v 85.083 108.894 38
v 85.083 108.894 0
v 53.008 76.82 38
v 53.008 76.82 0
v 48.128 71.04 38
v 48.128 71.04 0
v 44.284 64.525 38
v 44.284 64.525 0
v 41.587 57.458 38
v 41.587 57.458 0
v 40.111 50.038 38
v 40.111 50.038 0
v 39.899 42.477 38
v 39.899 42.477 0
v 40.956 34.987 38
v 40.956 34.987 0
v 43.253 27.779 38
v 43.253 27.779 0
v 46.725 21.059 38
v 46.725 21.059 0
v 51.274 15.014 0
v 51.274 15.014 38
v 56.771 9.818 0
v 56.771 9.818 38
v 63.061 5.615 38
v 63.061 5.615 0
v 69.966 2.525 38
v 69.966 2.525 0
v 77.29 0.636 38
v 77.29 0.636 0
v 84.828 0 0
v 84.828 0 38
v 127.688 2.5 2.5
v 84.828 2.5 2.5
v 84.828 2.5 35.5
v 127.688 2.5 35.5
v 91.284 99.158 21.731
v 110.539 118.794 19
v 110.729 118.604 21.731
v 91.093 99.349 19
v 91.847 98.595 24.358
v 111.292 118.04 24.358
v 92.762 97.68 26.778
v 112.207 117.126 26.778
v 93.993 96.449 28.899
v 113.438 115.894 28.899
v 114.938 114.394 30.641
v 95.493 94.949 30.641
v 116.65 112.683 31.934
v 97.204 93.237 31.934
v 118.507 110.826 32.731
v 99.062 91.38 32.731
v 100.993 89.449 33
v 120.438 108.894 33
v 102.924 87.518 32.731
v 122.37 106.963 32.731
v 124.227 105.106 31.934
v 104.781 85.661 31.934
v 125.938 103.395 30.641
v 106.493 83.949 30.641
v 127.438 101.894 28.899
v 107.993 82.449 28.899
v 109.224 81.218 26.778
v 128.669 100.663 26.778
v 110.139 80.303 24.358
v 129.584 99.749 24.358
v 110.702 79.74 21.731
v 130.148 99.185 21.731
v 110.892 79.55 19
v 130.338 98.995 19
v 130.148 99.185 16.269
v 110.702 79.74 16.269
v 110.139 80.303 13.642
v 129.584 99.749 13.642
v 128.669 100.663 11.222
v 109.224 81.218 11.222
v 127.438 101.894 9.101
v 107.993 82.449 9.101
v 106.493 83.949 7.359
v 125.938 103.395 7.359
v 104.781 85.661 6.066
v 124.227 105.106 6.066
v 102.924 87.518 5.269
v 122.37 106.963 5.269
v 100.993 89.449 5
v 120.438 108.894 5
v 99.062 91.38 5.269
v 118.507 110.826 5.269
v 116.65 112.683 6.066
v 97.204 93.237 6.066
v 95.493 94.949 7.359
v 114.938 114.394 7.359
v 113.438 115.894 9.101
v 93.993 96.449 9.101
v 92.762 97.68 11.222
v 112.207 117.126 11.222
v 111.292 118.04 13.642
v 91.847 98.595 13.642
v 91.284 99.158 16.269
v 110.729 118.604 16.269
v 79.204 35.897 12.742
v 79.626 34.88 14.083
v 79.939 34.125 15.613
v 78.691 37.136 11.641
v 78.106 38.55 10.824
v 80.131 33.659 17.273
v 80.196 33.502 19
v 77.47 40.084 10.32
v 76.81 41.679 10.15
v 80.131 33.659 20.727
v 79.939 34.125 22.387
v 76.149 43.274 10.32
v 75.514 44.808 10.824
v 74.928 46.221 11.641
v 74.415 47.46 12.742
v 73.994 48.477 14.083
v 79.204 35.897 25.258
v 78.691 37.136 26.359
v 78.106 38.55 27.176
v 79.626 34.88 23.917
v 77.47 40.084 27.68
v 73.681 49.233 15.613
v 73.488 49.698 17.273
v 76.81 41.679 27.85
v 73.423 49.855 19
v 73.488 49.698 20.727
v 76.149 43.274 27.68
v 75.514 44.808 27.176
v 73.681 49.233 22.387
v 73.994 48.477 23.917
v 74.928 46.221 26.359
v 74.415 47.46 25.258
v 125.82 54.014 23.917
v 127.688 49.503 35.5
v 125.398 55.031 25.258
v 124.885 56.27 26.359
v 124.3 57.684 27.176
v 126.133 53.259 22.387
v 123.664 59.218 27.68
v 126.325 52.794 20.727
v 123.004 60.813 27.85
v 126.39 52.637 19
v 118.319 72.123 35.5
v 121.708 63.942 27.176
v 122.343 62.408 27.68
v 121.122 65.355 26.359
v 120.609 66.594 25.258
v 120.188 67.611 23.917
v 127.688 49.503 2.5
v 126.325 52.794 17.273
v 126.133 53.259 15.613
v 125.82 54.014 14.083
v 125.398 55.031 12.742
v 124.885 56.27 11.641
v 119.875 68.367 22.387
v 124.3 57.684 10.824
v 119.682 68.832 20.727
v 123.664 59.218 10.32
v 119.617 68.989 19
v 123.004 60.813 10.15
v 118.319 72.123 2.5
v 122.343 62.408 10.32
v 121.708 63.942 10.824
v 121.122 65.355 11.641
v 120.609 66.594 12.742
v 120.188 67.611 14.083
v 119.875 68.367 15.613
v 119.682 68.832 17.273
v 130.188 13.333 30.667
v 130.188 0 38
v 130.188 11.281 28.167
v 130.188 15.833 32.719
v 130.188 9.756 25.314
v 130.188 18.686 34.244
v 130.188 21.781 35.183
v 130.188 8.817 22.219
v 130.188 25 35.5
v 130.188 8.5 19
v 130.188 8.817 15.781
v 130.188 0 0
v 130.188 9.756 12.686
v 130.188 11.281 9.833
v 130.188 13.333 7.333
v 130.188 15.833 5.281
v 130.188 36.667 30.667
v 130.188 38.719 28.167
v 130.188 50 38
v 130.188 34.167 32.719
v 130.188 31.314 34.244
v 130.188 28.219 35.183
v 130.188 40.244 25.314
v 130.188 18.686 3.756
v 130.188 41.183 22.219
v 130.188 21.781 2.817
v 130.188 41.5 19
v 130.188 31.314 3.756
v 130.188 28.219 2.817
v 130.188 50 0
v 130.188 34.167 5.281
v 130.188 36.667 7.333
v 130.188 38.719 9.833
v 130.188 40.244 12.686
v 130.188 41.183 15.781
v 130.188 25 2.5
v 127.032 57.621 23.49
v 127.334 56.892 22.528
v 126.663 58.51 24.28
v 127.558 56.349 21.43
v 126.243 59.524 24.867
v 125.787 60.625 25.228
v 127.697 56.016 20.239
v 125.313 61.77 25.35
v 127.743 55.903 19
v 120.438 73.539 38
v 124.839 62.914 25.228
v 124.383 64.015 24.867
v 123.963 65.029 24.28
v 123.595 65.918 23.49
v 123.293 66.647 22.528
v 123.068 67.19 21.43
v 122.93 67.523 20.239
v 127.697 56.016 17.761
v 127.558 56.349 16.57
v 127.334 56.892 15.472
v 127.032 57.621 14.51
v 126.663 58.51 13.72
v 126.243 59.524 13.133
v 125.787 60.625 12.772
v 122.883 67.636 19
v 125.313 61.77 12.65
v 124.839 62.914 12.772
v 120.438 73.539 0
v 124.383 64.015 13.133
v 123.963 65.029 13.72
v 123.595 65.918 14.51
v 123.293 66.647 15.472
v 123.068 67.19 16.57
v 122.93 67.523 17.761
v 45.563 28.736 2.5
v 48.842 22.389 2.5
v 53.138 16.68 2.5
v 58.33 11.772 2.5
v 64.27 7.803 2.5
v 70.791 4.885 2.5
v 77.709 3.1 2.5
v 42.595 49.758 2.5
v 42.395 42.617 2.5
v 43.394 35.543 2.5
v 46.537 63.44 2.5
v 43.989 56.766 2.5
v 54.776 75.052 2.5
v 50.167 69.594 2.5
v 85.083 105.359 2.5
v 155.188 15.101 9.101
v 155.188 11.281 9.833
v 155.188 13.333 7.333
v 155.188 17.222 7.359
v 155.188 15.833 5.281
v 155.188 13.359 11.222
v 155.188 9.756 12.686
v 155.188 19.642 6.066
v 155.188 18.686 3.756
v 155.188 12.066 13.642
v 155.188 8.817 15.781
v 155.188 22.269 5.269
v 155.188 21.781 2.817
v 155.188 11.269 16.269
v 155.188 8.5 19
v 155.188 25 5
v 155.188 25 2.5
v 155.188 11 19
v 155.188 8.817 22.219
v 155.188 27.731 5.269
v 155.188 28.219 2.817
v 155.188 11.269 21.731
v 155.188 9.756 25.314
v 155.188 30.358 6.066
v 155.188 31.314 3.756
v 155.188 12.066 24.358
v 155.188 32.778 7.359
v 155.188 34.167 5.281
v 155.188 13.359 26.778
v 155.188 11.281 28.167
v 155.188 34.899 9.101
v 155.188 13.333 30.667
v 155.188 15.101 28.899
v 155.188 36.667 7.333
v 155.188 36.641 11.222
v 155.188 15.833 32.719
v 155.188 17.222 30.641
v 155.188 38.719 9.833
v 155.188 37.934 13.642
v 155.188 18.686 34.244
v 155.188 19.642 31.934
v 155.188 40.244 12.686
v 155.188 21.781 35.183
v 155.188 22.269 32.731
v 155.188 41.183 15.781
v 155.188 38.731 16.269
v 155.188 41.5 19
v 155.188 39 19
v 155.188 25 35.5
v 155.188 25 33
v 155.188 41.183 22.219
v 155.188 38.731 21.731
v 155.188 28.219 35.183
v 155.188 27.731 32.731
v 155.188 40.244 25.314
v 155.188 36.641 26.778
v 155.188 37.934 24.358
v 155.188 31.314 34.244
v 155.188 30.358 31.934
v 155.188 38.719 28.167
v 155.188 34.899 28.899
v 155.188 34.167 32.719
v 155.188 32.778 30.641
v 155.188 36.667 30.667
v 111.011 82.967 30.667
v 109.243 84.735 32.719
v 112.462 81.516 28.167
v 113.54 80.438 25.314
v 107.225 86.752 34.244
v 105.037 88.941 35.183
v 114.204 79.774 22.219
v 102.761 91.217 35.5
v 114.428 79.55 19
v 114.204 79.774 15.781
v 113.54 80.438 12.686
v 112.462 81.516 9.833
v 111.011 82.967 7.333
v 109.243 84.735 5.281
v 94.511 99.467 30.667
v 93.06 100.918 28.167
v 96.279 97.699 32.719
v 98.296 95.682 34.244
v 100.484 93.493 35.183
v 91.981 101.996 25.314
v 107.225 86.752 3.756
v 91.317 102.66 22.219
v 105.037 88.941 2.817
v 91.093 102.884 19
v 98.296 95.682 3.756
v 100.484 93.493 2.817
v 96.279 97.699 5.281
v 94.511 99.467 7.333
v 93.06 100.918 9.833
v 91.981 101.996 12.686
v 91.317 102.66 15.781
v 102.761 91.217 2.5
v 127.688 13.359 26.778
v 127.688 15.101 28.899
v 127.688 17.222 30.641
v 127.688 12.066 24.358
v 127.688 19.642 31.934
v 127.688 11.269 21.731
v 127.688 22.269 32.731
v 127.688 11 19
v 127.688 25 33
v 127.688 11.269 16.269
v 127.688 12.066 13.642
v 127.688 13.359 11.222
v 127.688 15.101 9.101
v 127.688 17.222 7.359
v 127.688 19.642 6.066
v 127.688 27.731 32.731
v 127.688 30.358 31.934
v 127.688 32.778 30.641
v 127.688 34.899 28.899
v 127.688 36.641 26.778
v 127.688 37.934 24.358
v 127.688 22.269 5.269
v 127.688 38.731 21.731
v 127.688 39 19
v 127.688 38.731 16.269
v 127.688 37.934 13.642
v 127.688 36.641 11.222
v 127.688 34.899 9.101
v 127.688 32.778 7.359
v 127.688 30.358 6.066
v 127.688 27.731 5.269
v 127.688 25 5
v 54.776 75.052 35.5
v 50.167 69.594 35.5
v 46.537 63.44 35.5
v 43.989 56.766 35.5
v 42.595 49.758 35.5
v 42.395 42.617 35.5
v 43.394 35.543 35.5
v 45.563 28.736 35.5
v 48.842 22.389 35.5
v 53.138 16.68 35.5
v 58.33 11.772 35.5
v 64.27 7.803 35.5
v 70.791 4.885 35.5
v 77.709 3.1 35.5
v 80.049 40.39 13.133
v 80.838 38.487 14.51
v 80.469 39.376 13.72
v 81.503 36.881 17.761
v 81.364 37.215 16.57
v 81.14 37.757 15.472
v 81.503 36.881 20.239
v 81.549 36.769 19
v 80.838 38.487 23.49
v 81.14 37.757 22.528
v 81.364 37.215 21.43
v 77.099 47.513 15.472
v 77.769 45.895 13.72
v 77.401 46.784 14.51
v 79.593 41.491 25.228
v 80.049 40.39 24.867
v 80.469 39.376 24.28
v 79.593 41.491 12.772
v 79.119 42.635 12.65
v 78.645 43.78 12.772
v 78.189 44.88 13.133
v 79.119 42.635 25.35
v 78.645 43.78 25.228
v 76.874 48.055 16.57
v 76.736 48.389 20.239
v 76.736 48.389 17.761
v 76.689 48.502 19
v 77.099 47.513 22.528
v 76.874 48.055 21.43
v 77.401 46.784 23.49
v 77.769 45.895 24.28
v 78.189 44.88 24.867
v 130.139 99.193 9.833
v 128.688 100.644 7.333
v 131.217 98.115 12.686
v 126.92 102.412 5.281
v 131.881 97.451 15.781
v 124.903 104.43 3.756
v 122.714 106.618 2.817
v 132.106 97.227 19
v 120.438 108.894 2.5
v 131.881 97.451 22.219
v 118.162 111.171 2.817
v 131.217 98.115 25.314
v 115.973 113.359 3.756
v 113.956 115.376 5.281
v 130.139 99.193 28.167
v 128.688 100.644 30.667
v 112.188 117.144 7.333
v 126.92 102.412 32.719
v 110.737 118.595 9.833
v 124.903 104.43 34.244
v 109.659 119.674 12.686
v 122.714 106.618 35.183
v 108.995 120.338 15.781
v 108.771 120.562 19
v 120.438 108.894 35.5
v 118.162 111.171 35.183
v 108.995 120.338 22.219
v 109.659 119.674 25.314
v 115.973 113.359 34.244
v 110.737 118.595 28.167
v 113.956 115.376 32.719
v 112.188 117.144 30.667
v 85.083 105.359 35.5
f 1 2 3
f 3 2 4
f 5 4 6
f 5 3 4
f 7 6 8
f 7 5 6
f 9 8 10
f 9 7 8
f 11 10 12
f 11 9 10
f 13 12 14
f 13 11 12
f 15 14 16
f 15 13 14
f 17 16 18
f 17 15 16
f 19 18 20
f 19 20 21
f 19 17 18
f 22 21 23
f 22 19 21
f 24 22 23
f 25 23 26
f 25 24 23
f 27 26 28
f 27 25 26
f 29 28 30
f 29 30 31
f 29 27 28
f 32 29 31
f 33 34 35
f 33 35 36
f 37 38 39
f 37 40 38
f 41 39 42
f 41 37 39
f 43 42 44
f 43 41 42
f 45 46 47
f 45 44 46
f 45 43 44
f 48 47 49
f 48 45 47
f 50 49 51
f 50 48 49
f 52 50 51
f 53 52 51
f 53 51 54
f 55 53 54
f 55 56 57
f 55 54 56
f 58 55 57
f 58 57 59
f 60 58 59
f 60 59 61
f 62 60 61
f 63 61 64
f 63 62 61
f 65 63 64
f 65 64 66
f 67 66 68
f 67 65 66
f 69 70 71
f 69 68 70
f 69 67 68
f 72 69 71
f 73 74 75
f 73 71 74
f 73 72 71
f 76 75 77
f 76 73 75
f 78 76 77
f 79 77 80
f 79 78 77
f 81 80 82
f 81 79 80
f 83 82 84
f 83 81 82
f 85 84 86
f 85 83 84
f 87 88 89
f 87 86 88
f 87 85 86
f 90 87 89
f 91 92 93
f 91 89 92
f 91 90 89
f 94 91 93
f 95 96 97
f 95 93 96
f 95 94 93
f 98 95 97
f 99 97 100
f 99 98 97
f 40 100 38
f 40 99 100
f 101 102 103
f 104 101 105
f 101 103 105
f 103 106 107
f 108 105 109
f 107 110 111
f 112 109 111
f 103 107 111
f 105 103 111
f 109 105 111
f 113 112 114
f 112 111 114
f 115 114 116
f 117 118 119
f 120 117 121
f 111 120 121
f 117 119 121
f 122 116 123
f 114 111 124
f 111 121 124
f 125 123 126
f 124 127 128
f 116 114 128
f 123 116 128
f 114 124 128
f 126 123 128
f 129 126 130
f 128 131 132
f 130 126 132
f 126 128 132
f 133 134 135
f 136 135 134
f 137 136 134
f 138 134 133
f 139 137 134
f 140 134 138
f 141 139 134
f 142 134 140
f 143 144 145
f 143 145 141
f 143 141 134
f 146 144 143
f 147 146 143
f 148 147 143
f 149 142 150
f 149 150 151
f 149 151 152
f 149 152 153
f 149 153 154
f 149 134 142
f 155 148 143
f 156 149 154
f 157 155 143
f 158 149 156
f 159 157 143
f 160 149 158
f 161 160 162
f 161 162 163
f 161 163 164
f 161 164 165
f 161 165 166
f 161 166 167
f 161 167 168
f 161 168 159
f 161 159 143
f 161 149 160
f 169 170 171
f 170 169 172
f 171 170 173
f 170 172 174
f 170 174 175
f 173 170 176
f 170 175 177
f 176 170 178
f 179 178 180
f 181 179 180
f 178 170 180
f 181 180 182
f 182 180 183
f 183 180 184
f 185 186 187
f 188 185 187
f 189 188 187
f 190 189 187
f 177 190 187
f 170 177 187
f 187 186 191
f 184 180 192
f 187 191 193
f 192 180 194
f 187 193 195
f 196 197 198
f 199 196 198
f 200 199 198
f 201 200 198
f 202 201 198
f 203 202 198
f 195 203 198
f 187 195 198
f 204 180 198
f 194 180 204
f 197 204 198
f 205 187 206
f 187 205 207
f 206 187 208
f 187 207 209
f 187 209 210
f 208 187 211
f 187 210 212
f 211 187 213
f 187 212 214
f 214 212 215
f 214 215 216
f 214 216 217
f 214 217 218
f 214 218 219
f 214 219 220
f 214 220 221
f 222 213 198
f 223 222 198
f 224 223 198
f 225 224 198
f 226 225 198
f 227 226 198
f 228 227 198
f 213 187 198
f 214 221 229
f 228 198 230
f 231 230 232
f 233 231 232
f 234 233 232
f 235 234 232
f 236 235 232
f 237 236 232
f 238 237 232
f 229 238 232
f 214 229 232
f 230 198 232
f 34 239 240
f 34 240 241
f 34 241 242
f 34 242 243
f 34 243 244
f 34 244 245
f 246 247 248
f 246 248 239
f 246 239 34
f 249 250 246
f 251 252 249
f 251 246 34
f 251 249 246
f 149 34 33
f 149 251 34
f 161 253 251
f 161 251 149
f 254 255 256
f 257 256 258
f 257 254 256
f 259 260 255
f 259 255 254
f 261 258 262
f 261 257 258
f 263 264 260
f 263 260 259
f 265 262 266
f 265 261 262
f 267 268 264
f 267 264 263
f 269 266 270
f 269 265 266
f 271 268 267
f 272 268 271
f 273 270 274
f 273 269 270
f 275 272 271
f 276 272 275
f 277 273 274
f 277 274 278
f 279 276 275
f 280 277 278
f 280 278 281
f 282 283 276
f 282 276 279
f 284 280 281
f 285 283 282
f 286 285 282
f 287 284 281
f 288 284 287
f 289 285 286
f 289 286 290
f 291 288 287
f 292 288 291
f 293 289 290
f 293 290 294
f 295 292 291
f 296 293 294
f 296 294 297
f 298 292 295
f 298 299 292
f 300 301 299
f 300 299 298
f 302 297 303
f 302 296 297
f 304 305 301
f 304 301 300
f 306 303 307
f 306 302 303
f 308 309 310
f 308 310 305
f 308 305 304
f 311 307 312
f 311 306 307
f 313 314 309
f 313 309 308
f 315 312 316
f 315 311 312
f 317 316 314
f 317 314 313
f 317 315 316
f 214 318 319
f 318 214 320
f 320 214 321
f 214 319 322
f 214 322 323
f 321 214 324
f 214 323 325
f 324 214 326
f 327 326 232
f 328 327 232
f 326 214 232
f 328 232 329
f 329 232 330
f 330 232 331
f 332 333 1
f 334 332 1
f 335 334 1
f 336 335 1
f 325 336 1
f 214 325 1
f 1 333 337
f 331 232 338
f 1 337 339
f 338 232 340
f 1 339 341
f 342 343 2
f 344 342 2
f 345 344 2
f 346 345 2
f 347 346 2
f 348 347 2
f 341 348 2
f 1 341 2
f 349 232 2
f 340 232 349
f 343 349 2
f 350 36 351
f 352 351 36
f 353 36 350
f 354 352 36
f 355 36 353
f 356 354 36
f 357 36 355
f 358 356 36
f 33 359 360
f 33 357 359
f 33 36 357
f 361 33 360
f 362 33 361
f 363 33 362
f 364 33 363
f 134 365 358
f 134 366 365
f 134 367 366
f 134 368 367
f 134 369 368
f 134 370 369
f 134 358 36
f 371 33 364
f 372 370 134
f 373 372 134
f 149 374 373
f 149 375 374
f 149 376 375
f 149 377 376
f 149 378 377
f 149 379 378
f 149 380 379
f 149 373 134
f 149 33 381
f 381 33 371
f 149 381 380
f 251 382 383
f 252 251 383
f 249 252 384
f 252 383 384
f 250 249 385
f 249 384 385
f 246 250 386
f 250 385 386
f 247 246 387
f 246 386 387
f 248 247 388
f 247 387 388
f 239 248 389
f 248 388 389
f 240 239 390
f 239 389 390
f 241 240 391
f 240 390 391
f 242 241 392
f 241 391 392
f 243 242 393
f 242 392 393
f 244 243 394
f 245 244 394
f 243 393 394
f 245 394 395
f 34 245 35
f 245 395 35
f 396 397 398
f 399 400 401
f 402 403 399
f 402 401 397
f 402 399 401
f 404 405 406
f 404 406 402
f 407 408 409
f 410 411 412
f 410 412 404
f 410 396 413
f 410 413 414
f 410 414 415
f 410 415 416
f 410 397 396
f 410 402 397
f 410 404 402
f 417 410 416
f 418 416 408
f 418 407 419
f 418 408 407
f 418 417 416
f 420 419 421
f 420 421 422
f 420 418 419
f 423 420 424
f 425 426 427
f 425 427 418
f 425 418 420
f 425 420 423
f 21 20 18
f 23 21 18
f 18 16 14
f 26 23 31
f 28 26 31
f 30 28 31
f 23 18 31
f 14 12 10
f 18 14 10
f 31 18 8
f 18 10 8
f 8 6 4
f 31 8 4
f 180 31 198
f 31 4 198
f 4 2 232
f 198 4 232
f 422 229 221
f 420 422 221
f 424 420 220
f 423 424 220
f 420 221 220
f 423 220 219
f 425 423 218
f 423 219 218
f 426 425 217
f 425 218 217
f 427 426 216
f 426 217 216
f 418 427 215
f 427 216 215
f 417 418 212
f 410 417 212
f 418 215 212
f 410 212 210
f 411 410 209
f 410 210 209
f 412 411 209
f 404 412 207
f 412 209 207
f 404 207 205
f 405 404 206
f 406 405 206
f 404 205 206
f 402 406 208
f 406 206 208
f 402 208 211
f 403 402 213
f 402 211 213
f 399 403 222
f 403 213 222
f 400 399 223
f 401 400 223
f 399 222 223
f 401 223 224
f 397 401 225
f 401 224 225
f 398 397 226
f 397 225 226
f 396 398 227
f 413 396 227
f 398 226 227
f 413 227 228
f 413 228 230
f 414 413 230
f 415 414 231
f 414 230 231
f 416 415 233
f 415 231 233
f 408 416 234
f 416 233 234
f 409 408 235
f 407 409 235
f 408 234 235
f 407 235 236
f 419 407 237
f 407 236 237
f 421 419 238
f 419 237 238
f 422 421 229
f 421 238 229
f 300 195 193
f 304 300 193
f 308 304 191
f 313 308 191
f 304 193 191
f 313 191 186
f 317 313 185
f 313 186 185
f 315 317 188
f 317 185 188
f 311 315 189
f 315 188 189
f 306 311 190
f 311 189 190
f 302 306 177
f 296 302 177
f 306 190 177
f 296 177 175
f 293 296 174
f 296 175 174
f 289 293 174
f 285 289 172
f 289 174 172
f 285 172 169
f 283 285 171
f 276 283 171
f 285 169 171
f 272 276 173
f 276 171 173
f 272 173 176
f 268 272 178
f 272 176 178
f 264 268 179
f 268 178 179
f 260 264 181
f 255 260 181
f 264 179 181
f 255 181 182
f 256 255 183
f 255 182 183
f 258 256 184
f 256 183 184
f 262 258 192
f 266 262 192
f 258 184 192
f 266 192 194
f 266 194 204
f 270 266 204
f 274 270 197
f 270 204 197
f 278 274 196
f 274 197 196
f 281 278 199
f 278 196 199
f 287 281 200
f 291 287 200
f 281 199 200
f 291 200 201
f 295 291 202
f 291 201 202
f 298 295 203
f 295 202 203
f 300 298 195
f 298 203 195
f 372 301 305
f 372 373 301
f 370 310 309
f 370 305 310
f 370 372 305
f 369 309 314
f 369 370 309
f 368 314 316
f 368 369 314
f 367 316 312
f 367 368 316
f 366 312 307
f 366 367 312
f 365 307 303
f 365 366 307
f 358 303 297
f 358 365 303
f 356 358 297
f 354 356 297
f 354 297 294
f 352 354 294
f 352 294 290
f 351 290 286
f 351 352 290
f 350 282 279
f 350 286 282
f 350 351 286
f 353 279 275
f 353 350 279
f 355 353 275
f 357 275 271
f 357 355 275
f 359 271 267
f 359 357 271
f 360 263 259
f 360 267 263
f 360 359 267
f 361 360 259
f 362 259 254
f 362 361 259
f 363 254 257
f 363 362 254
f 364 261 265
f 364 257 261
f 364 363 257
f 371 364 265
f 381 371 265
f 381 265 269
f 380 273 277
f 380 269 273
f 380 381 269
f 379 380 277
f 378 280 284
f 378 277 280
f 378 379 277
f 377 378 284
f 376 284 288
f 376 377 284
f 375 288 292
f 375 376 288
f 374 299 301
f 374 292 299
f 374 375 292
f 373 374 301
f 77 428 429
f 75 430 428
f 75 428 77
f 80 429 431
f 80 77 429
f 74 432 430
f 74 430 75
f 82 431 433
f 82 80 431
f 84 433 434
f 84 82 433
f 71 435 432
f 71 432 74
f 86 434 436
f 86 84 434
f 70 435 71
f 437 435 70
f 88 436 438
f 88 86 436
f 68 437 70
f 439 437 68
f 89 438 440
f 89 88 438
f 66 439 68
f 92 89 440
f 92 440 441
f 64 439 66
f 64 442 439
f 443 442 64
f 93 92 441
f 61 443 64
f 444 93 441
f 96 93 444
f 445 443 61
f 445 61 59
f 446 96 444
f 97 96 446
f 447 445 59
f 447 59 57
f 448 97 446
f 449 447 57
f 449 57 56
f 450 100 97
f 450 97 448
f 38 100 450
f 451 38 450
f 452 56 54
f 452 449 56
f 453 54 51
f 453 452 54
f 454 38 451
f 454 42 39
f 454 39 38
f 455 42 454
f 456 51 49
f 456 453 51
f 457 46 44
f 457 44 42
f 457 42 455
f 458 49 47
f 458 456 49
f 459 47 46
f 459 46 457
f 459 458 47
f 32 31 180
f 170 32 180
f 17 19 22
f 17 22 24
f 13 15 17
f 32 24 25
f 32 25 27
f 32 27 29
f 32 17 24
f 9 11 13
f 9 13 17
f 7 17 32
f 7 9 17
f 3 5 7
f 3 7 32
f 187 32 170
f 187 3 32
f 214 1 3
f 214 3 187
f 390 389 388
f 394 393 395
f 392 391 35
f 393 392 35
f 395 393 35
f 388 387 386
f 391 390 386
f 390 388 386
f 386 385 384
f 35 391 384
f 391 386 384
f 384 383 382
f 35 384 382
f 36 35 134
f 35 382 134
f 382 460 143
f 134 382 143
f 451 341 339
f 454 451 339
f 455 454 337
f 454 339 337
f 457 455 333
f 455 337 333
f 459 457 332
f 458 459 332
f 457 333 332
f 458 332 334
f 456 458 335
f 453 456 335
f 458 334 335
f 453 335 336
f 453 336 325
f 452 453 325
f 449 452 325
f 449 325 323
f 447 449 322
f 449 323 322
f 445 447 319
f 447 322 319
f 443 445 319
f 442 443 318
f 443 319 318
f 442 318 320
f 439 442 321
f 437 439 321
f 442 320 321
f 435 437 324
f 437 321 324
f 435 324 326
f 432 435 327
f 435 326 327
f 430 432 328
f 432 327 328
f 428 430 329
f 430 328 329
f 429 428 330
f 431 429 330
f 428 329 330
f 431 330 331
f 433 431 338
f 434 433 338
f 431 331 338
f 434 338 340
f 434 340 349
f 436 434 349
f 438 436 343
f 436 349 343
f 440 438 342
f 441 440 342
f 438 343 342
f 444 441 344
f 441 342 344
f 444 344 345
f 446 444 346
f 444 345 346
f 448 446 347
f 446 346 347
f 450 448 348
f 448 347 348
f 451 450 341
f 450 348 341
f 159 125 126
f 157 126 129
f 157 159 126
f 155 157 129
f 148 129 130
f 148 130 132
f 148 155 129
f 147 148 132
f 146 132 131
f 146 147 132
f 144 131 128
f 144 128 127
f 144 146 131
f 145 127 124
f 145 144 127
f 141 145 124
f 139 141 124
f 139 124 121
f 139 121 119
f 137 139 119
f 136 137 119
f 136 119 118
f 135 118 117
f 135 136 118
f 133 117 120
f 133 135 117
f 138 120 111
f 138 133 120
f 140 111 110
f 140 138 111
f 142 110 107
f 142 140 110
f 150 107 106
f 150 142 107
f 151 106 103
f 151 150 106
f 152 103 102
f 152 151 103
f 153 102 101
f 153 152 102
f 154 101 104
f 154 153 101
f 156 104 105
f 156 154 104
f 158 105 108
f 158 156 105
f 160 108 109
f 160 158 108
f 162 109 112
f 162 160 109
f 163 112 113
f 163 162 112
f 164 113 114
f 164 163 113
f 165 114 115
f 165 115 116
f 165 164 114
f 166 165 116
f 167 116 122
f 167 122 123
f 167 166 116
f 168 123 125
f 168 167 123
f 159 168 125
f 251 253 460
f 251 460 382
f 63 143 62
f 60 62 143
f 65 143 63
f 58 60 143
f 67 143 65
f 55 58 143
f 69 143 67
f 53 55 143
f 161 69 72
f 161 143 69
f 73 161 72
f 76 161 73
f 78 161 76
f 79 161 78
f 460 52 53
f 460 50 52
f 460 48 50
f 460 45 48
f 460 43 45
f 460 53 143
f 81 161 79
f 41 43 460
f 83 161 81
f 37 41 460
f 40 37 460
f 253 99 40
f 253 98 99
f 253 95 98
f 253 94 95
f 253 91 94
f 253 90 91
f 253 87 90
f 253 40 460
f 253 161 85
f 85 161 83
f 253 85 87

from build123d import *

# Parameters (mm, degrees)
F1_DEPTH = 38
F2_R     = 16.5
F3_DEPTH = 25
F4_R     = 45
F5_R     = 16.5
F6_DEPTH = 25
F7_R     = 6.35
F8_DEPTH = 50
F9_T     = -2.5


with BuildPart() as f1:
    # F0 (on Top) → F1 (new body)
    with BuildSketch(Plane.XY):
        Polygon((85.0829000017, 108.8944443027), (-23.811544301, 0), (130.188455699, 0), (130.188455699, 50), (120.4382390611, 73.5391052434), align=None)
    extrude(amount=F1_DEPTH)

    # F2 (on face) → F3 (join)
    with BuildSketch(Plane.YZ.offset(130.188455699)):
        with Locations((25, 19)):
            Circle(F2_R)
    extrude(amount=F3_DEPTH)

    # F4
    f4_edges = [f1.edges().sort_by_distance(p)[0] for p in [
        (-23.811544, 0, 19),
    ]]
    fillet(f4_edges, radius=F4_R)

    # F5 (on face) → F6 (join)
    with BuildSketch(Plane(origin=(96.9886721522, 96.9886721522, 0), x_dir=(-0.7071067812, 0.7071067812, 0), z_dir=(0.7071067812, 0.7071067812, 0))):
        with Locations((-8.1626955542, 19)):
            Circle(F5_R)
    extrude(amount=F6_DEPTH)

    # F7 (on face) → F8 (cut)
    with BuildSketch(Plane(origin=(128.8004673077, 53.3509003988, 0), x_dir=(-0.3826834324, 0.9238795325, 0), z_dir=(0.9238795325, 0.3826834324, 0))):
        with Locations((9.112283503, 19)):
            Circle(F7_R)
    extrude(amount=-F8_DEPTH, mode=Mode.SUBTRACT)

    # F9
    f9_openings = [f1.faces().sort_by_distance(p)[0] for p in [
        (155.188456, 25, 19),
        (120.438239, 108.894444, 19),
    ]]
    offset(amount=F9_T, openings=f9_openings, kind=Kind.INTERSECTION)


solid = f1.part
